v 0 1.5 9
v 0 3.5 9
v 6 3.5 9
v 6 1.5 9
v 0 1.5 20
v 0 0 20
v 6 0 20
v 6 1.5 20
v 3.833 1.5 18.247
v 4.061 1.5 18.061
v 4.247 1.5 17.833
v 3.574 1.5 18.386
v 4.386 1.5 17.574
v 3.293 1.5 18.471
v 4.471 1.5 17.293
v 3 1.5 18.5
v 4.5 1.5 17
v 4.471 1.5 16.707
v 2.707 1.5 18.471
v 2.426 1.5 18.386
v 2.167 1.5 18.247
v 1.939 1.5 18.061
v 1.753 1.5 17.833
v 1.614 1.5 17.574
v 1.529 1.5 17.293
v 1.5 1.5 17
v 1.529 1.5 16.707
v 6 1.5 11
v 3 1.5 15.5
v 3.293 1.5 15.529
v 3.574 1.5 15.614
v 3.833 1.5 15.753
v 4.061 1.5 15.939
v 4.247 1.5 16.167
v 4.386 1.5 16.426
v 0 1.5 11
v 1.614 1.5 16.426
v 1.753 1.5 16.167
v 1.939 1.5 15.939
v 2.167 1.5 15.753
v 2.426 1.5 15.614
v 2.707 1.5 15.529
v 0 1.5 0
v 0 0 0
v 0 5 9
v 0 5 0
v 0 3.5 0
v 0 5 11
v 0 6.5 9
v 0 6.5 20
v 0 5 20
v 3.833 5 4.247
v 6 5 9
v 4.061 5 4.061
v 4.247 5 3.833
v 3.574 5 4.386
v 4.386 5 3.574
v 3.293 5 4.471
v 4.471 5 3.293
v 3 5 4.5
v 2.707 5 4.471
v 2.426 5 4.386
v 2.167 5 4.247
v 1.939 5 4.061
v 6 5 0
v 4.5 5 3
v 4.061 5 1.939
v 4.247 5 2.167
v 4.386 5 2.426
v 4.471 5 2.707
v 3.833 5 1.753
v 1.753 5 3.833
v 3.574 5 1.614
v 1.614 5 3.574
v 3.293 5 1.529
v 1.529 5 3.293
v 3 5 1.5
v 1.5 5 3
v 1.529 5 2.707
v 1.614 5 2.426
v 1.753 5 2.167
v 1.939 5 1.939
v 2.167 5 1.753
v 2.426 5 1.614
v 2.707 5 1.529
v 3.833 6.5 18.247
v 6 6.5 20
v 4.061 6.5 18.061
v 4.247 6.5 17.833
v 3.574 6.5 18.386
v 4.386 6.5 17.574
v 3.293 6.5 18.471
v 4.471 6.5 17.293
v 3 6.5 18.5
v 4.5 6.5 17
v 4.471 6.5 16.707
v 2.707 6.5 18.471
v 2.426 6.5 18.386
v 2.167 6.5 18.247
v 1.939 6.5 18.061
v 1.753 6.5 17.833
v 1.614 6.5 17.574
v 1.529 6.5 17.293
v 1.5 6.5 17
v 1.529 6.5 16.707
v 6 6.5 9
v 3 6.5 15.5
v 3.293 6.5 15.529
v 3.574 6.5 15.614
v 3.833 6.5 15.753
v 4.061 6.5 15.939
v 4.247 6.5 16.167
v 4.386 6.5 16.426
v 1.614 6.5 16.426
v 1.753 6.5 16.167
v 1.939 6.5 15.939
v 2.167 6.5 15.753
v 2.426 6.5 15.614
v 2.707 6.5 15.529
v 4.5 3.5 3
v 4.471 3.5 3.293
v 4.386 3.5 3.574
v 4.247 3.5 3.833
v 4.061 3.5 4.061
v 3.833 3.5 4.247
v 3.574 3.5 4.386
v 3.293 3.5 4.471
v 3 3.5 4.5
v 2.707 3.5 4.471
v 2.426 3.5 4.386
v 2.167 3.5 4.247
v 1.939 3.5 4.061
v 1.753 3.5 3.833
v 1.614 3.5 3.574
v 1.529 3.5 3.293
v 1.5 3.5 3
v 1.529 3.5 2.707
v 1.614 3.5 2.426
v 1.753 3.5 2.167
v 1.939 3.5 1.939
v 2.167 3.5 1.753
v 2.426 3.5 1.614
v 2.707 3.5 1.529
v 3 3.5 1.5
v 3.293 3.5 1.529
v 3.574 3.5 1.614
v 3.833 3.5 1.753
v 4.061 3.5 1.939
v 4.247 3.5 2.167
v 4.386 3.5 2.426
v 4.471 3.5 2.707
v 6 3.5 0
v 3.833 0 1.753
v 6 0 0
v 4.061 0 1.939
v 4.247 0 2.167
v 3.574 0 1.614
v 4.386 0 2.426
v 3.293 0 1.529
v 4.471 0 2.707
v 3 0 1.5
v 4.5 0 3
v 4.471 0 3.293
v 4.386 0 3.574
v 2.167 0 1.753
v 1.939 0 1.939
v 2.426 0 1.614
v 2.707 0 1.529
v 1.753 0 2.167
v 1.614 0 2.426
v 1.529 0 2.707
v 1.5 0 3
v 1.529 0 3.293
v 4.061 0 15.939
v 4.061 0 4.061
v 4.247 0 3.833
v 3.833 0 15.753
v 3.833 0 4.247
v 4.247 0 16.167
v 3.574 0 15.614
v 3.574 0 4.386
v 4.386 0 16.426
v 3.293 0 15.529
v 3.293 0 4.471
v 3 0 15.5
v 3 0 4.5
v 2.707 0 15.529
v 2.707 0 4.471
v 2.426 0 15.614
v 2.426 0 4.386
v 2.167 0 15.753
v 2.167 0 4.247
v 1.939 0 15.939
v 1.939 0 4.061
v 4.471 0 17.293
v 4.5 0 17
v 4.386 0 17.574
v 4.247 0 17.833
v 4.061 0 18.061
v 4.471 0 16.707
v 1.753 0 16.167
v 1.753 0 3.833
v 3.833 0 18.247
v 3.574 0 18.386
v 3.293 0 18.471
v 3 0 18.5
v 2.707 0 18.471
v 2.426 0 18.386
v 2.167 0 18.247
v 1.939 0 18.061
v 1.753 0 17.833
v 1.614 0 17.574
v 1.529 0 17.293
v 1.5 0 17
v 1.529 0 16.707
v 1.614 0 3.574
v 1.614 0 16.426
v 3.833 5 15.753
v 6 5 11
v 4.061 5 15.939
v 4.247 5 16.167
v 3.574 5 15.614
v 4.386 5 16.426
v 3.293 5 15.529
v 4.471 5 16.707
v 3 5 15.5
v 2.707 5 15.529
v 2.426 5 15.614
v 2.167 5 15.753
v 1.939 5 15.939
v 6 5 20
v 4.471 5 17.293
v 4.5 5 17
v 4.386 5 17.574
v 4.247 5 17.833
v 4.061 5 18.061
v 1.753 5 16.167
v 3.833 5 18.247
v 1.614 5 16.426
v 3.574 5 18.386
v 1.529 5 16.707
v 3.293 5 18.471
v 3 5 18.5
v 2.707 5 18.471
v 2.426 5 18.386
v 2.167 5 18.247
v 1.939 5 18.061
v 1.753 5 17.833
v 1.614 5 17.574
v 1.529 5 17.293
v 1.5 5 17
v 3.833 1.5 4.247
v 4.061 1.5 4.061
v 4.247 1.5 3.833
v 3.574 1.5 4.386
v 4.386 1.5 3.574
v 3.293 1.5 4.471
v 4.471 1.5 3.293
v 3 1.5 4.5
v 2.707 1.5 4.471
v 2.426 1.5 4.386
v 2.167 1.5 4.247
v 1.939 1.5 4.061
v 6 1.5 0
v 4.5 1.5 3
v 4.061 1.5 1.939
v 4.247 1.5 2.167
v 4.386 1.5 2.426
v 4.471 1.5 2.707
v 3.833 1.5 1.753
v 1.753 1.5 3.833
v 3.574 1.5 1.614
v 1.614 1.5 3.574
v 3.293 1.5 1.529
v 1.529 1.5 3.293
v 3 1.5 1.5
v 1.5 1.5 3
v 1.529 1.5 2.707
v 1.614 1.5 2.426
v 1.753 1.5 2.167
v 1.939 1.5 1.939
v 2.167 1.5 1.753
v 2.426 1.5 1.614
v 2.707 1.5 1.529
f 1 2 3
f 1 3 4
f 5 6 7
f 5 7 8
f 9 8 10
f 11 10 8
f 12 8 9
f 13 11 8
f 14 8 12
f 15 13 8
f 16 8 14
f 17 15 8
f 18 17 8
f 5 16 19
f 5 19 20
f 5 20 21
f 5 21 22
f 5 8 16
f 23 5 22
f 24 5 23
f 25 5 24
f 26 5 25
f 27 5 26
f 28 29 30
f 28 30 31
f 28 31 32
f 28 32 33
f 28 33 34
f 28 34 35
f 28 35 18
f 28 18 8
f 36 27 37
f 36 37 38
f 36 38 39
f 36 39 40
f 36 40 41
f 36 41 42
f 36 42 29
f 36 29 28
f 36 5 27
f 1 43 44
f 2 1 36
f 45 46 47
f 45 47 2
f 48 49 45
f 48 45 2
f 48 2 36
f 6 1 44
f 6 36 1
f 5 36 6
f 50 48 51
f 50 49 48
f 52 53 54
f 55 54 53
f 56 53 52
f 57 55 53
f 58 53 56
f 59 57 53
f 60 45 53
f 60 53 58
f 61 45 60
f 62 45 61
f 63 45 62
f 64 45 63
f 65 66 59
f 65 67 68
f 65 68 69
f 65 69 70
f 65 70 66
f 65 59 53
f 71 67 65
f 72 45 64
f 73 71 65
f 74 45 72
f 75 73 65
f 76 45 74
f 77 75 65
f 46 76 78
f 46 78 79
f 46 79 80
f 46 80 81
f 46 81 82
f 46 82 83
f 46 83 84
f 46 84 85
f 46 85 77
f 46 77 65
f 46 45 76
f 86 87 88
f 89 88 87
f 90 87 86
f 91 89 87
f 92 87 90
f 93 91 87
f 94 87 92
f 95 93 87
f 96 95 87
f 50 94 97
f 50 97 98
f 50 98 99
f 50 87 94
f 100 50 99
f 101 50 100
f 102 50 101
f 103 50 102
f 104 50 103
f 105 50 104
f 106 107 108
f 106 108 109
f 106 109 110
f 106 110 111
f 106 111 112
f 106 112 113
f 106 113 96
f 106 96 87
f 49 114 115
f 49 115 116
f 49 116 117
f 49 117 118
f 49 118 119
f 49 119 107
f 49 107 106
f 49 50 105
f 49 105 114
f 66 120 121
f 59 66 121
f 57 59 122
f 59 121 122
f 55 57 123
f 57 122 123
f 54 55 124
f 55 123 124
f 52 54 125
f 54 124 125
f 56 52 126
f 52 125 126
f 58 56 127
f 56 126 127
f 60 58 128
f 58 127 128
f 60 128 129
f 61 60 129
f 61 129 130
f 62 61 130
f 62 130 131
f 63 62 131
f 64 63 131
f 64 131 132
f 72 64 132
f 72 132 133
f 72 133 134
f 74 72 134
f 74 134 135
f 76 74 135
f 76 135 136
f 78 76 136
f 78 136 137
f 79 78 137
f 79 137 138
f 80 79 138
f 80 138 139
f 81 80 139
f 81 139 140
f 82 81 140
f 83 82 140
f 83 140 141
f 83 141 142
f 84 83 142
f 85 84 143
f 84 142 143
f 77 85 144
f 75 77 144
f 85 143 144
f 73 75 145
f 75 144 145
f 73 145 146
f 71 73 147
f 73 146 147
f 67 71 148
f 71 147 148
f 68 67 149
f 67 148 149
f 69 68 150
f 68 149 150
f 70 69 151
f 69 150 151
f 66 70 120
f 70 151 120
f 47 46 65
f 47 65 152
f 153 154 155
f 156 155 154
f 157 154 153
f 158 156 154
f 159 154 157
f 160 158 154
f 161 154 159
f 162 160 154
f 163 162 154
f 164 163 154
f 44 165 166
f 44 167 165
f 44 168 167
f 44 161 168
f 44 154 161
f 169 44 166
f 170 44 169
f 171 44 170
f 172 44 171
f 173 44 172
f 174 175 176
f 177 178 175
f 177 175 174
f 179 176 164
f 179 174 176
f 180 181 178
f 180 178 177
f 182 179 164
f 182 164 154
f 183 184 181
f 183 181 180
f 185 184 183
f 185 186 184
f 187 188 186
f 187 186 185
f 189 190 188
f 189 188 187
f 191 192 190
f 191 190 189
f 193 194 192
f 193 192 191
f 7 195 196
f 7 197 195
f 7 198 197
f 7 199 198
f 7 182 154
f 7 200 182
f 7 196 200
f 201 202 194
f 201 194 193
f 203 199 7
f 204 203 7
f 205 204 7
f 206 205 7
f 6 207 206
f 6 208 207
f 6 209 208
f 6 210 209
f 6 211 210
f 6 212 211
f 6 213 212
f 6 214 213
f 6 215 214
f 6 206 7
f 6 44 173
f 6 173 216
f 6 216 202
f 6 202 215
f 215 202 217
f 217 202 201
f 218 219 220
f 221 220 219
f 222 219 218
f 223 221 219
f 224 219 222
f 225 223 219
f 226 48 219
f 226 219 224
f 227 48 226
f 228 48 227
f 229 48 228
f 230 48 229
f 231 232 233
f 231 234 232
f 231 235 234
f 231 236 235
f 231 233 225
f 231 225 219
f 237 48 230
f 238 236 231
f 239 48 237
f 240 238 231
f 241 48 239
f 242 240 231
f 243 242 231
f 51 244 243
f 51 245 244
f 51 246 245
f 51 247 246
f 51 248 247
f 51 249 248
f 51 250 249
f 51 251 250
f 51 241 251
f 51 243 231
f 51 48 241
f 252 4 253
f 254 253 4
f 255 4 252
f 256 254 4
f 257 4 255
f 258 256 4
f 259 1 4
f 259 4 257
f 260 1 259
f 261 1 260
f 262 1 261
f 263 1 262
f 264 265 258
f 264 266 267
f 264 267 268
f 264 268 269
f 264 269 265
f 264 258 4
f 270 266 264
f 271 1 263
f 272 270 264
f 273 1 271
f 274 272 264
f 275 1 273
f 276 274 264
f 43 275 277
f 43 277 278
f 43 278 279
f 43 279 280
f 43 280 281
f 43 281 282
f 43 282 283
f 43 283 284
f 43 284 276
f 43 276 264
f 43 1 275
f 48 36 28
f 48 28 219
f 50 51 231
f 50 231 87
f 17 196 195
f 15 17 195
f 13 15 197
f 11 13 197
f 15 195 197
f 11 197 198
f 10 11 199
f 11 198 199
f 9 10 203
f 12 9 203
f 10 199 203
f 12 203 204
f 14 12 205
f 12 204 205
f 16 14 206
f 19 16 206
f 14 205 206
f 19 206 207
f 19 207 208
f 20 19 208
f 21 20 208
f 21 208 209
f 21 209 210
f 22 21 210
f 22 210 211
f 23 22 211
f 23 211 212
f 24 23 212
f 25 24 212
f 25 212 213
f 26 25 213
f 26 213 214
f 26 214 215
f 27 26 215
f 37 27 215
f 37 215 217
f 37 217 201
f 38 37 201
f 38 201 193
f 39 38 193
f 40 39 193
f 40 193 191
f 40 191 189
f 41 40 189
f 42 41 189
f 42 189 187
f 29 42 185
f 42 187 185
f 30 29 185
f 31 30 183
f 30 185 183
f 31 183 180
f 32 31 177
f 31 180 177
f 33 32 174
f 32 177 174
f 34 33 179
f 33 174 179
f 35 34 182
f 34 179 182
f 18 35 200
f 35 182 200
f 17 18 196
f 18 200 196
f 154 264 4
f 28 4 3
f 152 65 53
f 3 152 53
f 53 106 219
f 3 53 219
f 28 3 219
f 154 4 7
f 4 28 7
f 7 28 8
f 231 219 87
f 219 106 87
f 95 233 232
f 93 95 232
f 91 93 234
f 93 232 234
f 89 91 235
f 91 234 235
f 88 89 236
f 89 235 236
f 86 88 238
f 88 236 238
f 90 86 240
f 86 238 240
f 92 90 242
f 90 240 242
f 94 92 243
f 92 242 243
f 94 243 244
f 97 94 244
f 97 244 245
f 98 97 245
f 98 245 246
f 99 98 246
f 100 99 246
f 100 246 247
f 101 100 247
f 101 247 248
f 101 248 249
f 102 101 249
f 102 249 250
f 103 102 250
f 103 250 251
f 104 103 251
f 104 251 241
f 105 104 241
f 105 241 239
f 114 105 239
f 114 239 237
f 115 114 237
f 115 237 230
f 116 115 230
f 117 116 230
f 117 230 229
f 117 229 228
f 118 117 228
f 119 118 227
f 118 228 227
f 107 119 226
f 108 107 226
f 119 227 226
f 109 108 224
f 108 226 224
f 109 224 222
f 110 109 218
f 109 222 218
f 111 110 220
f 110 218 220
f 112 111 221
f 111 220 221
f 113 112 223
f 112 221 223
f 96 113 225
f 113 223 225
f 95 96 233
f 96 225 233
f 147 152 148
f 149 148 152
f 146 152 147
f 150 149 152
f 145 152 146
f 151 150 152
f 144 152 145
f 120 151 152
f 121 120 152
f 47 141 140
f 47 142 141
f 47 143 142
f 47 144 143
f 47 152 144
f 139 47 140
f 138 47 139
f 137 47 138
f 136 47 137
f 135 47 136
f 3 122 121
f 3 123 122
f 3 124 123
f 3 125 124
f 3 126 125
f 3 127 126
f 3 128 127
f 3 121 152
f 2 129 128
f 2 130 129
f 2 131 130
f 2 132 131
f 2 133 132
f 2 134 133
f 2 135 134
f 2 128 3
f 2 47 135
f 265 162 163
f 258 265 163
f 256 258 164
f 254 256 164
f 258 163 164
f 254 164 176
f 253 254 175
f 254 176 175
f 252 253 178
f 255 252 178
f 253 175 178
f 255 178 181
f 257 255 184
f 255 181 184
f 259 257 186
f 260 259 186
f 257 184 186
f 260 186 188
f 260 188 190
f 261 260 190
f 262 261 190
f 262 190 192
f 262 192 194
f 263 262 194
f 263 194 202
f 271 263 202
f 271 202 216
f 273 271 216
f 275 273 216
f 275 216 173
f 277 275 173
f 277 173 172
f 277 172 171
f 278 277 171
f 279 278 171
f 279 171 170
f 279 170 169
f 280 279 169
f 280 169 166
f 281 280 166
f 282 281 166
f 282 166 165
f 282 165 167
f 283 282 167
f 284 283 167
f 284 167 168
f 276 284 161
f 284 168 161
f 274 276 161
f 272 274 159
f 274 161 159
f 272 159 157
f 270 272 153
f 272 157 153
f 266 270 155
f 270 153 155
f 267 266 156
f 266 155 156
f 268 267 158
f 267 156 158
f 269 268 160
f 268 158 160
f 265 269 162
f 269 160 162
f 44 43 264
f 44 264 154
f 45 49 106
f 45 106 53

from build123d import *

# Parameters (mm, degrees)
BOSS_EXTRUDE1_DEPTH     = 6
SKETCH2_R               = 1.5
CUT_EXTRUDE1_DEPTH      = 1
CUT_EXTRUDE1_DEPTH_BACK = 7.5


with BuildPart() as part:
    # Sketch1 → Boss-Extrude1 (new body)
    with BuildSketch(Plane(origin=(0, 0, 0), x_dir=(0, 0, -1), z_dir=(1, 0, 0))):
        Polygon((0, 0), (-20, 0), (-20, 1.5), (-11, 1.5), (-11, 5), (-20, 5), (-20, 6.5), (-9, 6.5), (-9, 5), (0, 5), (0, 3.5), (-9, 3.5), (-9, 1.5), (0, 1.5), align=None)
    extrude(amount=BOSS_EXTRUDE1_DEPTH)

    # Sketch2 → Cut-Extrude1 (cut, two sides)
    with BuildSketch(Plane.XZ) as cut_extrude1_sk:
        with Locations((3, 3)):
            Circle(SKETCH2_R)
        with Locations((3, 17)):
            Circle(SKETCH2_R)
    extrude(amount=CUT_EXTRUDE1_DEPTH, mode=Mode.SUBTRACT)
    extrude(cut_extrude1_sk.sketch, amount=-CUT_EXTRUDE1_DEPTH_BACK, mode=Mode.SUBTRACT)


solid = part.part
